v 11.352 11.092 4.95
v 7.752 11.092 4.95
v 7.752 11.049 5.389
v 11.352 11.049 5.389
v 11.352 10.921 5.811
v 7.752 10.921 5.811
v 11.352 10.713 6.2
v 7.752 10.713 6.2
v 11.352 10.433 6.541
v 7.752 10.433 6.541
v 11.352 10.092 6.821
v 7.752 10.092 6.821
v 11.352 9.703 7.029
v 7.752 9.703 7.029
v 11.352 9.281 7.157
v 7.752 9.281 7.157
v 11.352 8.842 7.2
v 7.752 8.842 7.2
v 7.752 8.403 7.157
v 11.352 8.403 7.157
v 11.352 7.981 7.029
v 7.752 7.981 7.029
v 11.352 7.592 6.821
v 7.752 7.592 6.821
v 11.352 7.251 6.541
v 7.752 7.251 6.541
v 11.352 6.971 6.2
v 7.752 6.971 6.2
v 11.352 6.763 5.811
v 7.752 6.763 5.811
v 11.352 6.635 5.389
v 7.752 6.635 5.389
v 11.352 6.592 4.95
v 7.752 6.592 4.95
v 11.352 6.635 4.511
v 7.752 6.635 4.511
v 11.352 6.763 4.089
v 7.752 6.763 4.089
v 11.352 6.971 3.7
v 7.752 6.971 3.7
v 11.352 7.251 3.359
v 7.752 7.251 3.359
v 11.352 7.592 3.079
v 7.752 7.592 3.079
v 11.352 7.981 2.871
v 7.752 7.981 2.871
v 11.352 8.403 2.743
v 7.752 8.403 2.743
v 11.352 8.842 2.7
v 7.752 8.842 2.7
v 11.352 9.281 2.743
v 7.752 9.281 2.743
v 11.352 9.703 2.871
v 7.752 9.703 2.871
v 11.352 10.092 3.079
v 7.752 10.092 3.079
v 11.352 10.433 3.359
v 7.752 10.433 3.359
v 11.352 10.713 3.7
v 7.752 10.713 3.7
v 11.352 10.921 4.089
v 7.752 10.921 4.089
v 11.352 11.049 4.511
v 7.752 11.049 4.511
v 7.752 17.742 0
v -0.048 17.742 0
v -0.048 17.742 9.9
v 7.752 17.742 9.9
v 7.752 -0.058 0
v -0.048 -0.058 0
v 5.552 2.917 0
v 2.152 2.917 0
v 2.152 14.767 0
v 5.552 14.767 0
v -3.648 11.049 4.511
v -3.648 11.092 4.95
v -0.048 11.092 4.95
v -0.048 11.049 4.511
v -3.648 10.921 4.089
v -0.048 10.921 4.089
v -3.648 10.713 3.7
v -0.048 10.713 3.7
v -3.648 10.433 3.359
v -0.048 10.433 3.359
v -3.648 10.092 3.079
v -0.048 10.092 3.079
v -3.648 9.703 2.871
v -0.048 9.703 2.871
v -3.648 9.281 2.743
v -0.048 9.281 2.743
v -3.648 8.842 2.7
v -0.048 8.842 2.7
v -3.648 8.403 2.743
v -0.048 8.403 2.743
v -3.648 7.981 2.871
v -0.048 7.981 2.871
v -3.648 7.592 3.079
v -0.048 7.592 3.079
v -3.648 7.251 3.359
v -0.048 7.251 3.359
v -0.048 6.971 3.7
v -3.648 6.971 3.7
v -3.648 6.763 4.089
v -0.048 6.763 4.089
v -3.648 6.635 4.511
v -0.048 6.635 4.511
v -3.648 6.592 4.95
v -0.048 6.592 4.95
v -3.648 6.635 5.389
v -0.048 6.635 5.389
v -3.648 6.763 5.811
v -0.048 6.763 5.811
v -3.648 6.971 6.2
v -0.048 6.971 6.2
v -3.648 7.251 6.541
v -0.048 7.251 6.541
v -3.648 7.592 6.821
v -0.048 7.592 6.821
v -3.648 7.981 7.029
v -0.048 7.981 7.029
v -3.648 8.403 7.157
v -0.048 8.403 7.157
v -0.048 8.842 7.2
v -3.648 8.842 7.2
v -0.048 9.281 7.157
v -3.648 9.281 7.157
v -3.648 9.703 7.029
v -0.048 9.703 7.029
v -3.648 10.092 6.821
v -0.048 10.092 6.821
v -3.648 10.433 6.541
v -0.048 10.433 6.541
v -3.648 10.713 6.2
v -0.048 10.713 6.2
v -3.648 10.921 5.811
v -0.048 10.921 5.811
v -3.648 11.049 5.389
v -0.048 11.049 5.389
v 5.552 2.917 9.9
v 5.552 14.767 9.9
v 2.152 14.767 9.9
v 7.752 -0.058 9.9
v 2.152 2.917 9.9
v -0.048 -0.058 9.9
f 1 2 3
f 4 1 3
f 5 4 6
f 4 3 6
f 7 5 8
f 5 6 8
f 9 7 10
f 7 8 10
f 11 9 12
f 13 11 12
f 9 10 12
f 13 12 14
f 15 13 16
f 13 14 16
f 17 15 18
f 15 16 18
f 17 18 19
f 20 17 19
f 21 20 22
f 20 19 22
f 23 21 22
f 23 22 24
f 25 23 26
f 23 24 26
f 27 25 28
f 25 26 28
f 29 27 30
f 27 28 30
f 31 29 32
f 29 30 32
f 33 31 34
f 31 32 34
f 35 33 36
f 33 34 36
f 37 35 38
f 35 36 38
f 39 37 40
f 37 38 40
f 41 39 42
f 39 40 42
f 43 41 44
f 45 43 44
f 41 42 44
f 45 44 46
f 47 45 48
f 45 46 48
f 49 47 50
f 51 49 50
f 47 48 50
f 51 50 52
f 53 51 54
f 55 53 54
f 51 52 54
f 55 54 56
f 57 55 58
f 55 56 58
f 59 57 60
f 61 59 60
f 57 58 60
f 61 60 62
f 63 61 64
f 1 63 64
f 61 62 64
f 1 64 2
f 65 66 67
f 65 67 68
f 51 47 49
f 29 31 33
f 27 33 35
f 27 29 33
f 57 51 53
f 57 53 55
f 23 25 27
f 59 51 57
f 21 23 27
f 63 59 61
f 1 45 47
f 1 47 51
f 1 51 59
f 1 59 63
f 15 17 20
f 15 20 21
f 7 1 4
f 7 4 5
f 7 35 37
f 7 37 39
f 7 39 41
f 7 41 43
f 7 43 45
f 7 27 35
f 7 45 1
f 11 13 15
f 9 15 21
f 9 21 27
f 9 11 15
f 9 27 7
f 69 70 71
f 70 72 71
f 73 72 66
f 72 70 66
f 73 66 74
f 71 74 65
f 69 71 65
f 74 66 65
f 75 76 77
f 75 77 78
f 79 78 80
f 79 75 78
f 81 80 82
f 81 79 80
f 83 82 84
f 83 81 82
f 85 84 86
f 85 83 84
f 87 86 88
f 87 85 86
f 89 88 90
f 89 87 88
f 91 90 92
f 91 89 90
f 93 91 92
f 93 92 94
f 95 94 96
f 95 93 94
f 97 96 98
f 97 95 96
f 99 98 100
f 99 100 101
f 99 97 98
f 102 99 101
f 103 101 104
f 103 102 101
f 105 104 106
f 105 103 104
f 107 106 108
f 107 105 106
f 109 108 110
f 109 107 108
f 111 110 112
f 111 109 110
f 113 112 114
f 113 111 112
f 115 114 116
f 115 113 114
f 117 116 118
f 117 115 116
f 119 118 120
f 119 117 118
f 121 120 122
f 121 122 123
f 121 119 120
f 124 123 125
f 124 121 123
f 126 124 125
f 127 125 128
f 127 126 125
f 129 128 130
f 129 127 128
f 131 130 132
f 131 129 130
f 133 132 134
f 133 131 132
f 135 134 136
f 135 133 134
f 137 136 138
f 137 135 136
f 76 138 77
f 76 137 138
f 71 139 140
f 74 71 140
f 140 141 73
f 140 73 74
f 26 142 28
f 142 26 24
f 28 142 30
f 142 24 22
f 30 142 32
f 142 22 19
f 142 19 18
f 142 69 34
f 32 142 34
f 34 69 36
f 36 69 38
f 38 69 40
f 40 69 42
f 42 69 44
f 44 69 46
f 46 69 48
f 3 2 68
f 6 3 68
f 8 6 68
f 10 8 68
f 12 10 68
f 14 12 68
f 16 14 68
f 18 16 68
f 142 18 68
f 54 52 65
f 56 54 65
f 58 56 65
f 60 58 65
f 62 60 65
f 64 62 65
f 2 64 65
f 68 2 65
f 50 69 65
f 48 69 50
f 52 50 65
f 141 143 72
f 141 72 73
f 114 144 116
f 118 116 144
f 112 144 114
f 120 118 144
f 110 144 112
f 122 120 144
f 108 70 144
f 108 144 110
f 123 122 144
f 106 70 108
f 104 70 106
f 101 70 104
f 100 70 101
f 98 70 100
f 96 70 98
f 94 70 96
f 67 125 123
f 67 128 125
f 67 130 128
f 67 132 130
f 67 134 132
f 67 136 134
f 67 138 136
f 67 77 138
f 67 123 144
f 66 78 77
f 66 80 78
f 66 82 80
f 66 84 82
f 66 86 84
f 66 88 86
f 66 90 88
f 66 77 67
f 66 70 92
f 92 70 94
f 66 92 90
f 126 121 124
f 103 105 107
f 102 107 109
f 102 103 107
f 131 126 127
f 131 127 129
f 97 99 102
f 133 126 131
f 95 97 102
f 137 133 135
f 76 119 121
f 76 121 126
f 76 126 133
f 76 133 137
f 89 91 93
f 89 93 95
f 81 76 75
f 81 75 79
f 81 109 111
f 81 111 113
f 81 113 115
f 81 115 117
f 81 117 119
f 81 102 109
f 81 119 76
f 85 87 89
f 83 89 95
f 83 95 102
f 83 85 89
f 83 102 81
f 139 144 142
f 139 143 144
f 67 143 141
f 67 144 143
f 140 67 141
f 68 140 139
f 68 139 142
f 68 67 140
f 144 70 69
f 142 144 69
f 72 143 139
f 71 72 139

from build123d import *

# Parameters (mm, degrees)
SKETCH2_W           = 7.8
SKETCH2_H           = 17.8
BOSS_EXTRUDE1_DEPTH = 9.9
SKETCH3_W           = 3.4
SKETCH3_H           = 11.85
CUT_EXTRUDE1_DEPTH  = 9.9
SKETCH5_R           = 2.25
BOSS_EXTRUDE2_DEPTH = 3.6
BOSS_EXTRUDE3_START = 3.6
SKETCH6_R           = 2.25
BOSS_EXTRUDE3_DEPTH = 3.6


with BuildPart() as part:
    # Sketch2 → Boss-Extrude1 (new body)
    with BuildSketch(Plane.XY):
        with Locations((3.852048319, 8.842226891)):
            Rectangle(SKETCH2_W, SKETCH2_H)
    extrude(amount=BOSS_EXTRUDE1_DEPTH)

    # Sketch3 → Cut-Extrude1 (cut)
    with BuildSketch(Plane.XY.offset(9.9)):
        with Locations((3.852048319, 8.842226891)):
            Rectangle(SKETCH3_W, SKETCH3_H)
    extrude(amount=-CUT_EXTRUDE1_DEPTH, mode=Mode.SUBTRACT)

    # Sketch5 → Boss-Extrude2 (add)
    with BuildSketch(Plane(origin=(7.752048319, 0, 0), x_dir=(0, 0, -1), z_dir=(1, 0, 0))):
        with Locations(Location((-4.95, 8.842226891, 0), (0, 0, 90))):
            Circle(SKETCH5_R)
    extrude(amount=BOSS_EXTRUDE2_DEPTH)

    # Sketch6 → Boss-Extrude3 (add)
    with BuildSketch(Plane.ZY.offset(0.047951681).offset(BOSS_EXTRUDE3_START)):
        with Locations(Location((4.95, 8.842226891, 0), (0, 0, 90))):
            Circle(SKETCH6_R)
    extrude(amount=-BOSS_EXTRUDE3_DEPTH)


solid = part.part
